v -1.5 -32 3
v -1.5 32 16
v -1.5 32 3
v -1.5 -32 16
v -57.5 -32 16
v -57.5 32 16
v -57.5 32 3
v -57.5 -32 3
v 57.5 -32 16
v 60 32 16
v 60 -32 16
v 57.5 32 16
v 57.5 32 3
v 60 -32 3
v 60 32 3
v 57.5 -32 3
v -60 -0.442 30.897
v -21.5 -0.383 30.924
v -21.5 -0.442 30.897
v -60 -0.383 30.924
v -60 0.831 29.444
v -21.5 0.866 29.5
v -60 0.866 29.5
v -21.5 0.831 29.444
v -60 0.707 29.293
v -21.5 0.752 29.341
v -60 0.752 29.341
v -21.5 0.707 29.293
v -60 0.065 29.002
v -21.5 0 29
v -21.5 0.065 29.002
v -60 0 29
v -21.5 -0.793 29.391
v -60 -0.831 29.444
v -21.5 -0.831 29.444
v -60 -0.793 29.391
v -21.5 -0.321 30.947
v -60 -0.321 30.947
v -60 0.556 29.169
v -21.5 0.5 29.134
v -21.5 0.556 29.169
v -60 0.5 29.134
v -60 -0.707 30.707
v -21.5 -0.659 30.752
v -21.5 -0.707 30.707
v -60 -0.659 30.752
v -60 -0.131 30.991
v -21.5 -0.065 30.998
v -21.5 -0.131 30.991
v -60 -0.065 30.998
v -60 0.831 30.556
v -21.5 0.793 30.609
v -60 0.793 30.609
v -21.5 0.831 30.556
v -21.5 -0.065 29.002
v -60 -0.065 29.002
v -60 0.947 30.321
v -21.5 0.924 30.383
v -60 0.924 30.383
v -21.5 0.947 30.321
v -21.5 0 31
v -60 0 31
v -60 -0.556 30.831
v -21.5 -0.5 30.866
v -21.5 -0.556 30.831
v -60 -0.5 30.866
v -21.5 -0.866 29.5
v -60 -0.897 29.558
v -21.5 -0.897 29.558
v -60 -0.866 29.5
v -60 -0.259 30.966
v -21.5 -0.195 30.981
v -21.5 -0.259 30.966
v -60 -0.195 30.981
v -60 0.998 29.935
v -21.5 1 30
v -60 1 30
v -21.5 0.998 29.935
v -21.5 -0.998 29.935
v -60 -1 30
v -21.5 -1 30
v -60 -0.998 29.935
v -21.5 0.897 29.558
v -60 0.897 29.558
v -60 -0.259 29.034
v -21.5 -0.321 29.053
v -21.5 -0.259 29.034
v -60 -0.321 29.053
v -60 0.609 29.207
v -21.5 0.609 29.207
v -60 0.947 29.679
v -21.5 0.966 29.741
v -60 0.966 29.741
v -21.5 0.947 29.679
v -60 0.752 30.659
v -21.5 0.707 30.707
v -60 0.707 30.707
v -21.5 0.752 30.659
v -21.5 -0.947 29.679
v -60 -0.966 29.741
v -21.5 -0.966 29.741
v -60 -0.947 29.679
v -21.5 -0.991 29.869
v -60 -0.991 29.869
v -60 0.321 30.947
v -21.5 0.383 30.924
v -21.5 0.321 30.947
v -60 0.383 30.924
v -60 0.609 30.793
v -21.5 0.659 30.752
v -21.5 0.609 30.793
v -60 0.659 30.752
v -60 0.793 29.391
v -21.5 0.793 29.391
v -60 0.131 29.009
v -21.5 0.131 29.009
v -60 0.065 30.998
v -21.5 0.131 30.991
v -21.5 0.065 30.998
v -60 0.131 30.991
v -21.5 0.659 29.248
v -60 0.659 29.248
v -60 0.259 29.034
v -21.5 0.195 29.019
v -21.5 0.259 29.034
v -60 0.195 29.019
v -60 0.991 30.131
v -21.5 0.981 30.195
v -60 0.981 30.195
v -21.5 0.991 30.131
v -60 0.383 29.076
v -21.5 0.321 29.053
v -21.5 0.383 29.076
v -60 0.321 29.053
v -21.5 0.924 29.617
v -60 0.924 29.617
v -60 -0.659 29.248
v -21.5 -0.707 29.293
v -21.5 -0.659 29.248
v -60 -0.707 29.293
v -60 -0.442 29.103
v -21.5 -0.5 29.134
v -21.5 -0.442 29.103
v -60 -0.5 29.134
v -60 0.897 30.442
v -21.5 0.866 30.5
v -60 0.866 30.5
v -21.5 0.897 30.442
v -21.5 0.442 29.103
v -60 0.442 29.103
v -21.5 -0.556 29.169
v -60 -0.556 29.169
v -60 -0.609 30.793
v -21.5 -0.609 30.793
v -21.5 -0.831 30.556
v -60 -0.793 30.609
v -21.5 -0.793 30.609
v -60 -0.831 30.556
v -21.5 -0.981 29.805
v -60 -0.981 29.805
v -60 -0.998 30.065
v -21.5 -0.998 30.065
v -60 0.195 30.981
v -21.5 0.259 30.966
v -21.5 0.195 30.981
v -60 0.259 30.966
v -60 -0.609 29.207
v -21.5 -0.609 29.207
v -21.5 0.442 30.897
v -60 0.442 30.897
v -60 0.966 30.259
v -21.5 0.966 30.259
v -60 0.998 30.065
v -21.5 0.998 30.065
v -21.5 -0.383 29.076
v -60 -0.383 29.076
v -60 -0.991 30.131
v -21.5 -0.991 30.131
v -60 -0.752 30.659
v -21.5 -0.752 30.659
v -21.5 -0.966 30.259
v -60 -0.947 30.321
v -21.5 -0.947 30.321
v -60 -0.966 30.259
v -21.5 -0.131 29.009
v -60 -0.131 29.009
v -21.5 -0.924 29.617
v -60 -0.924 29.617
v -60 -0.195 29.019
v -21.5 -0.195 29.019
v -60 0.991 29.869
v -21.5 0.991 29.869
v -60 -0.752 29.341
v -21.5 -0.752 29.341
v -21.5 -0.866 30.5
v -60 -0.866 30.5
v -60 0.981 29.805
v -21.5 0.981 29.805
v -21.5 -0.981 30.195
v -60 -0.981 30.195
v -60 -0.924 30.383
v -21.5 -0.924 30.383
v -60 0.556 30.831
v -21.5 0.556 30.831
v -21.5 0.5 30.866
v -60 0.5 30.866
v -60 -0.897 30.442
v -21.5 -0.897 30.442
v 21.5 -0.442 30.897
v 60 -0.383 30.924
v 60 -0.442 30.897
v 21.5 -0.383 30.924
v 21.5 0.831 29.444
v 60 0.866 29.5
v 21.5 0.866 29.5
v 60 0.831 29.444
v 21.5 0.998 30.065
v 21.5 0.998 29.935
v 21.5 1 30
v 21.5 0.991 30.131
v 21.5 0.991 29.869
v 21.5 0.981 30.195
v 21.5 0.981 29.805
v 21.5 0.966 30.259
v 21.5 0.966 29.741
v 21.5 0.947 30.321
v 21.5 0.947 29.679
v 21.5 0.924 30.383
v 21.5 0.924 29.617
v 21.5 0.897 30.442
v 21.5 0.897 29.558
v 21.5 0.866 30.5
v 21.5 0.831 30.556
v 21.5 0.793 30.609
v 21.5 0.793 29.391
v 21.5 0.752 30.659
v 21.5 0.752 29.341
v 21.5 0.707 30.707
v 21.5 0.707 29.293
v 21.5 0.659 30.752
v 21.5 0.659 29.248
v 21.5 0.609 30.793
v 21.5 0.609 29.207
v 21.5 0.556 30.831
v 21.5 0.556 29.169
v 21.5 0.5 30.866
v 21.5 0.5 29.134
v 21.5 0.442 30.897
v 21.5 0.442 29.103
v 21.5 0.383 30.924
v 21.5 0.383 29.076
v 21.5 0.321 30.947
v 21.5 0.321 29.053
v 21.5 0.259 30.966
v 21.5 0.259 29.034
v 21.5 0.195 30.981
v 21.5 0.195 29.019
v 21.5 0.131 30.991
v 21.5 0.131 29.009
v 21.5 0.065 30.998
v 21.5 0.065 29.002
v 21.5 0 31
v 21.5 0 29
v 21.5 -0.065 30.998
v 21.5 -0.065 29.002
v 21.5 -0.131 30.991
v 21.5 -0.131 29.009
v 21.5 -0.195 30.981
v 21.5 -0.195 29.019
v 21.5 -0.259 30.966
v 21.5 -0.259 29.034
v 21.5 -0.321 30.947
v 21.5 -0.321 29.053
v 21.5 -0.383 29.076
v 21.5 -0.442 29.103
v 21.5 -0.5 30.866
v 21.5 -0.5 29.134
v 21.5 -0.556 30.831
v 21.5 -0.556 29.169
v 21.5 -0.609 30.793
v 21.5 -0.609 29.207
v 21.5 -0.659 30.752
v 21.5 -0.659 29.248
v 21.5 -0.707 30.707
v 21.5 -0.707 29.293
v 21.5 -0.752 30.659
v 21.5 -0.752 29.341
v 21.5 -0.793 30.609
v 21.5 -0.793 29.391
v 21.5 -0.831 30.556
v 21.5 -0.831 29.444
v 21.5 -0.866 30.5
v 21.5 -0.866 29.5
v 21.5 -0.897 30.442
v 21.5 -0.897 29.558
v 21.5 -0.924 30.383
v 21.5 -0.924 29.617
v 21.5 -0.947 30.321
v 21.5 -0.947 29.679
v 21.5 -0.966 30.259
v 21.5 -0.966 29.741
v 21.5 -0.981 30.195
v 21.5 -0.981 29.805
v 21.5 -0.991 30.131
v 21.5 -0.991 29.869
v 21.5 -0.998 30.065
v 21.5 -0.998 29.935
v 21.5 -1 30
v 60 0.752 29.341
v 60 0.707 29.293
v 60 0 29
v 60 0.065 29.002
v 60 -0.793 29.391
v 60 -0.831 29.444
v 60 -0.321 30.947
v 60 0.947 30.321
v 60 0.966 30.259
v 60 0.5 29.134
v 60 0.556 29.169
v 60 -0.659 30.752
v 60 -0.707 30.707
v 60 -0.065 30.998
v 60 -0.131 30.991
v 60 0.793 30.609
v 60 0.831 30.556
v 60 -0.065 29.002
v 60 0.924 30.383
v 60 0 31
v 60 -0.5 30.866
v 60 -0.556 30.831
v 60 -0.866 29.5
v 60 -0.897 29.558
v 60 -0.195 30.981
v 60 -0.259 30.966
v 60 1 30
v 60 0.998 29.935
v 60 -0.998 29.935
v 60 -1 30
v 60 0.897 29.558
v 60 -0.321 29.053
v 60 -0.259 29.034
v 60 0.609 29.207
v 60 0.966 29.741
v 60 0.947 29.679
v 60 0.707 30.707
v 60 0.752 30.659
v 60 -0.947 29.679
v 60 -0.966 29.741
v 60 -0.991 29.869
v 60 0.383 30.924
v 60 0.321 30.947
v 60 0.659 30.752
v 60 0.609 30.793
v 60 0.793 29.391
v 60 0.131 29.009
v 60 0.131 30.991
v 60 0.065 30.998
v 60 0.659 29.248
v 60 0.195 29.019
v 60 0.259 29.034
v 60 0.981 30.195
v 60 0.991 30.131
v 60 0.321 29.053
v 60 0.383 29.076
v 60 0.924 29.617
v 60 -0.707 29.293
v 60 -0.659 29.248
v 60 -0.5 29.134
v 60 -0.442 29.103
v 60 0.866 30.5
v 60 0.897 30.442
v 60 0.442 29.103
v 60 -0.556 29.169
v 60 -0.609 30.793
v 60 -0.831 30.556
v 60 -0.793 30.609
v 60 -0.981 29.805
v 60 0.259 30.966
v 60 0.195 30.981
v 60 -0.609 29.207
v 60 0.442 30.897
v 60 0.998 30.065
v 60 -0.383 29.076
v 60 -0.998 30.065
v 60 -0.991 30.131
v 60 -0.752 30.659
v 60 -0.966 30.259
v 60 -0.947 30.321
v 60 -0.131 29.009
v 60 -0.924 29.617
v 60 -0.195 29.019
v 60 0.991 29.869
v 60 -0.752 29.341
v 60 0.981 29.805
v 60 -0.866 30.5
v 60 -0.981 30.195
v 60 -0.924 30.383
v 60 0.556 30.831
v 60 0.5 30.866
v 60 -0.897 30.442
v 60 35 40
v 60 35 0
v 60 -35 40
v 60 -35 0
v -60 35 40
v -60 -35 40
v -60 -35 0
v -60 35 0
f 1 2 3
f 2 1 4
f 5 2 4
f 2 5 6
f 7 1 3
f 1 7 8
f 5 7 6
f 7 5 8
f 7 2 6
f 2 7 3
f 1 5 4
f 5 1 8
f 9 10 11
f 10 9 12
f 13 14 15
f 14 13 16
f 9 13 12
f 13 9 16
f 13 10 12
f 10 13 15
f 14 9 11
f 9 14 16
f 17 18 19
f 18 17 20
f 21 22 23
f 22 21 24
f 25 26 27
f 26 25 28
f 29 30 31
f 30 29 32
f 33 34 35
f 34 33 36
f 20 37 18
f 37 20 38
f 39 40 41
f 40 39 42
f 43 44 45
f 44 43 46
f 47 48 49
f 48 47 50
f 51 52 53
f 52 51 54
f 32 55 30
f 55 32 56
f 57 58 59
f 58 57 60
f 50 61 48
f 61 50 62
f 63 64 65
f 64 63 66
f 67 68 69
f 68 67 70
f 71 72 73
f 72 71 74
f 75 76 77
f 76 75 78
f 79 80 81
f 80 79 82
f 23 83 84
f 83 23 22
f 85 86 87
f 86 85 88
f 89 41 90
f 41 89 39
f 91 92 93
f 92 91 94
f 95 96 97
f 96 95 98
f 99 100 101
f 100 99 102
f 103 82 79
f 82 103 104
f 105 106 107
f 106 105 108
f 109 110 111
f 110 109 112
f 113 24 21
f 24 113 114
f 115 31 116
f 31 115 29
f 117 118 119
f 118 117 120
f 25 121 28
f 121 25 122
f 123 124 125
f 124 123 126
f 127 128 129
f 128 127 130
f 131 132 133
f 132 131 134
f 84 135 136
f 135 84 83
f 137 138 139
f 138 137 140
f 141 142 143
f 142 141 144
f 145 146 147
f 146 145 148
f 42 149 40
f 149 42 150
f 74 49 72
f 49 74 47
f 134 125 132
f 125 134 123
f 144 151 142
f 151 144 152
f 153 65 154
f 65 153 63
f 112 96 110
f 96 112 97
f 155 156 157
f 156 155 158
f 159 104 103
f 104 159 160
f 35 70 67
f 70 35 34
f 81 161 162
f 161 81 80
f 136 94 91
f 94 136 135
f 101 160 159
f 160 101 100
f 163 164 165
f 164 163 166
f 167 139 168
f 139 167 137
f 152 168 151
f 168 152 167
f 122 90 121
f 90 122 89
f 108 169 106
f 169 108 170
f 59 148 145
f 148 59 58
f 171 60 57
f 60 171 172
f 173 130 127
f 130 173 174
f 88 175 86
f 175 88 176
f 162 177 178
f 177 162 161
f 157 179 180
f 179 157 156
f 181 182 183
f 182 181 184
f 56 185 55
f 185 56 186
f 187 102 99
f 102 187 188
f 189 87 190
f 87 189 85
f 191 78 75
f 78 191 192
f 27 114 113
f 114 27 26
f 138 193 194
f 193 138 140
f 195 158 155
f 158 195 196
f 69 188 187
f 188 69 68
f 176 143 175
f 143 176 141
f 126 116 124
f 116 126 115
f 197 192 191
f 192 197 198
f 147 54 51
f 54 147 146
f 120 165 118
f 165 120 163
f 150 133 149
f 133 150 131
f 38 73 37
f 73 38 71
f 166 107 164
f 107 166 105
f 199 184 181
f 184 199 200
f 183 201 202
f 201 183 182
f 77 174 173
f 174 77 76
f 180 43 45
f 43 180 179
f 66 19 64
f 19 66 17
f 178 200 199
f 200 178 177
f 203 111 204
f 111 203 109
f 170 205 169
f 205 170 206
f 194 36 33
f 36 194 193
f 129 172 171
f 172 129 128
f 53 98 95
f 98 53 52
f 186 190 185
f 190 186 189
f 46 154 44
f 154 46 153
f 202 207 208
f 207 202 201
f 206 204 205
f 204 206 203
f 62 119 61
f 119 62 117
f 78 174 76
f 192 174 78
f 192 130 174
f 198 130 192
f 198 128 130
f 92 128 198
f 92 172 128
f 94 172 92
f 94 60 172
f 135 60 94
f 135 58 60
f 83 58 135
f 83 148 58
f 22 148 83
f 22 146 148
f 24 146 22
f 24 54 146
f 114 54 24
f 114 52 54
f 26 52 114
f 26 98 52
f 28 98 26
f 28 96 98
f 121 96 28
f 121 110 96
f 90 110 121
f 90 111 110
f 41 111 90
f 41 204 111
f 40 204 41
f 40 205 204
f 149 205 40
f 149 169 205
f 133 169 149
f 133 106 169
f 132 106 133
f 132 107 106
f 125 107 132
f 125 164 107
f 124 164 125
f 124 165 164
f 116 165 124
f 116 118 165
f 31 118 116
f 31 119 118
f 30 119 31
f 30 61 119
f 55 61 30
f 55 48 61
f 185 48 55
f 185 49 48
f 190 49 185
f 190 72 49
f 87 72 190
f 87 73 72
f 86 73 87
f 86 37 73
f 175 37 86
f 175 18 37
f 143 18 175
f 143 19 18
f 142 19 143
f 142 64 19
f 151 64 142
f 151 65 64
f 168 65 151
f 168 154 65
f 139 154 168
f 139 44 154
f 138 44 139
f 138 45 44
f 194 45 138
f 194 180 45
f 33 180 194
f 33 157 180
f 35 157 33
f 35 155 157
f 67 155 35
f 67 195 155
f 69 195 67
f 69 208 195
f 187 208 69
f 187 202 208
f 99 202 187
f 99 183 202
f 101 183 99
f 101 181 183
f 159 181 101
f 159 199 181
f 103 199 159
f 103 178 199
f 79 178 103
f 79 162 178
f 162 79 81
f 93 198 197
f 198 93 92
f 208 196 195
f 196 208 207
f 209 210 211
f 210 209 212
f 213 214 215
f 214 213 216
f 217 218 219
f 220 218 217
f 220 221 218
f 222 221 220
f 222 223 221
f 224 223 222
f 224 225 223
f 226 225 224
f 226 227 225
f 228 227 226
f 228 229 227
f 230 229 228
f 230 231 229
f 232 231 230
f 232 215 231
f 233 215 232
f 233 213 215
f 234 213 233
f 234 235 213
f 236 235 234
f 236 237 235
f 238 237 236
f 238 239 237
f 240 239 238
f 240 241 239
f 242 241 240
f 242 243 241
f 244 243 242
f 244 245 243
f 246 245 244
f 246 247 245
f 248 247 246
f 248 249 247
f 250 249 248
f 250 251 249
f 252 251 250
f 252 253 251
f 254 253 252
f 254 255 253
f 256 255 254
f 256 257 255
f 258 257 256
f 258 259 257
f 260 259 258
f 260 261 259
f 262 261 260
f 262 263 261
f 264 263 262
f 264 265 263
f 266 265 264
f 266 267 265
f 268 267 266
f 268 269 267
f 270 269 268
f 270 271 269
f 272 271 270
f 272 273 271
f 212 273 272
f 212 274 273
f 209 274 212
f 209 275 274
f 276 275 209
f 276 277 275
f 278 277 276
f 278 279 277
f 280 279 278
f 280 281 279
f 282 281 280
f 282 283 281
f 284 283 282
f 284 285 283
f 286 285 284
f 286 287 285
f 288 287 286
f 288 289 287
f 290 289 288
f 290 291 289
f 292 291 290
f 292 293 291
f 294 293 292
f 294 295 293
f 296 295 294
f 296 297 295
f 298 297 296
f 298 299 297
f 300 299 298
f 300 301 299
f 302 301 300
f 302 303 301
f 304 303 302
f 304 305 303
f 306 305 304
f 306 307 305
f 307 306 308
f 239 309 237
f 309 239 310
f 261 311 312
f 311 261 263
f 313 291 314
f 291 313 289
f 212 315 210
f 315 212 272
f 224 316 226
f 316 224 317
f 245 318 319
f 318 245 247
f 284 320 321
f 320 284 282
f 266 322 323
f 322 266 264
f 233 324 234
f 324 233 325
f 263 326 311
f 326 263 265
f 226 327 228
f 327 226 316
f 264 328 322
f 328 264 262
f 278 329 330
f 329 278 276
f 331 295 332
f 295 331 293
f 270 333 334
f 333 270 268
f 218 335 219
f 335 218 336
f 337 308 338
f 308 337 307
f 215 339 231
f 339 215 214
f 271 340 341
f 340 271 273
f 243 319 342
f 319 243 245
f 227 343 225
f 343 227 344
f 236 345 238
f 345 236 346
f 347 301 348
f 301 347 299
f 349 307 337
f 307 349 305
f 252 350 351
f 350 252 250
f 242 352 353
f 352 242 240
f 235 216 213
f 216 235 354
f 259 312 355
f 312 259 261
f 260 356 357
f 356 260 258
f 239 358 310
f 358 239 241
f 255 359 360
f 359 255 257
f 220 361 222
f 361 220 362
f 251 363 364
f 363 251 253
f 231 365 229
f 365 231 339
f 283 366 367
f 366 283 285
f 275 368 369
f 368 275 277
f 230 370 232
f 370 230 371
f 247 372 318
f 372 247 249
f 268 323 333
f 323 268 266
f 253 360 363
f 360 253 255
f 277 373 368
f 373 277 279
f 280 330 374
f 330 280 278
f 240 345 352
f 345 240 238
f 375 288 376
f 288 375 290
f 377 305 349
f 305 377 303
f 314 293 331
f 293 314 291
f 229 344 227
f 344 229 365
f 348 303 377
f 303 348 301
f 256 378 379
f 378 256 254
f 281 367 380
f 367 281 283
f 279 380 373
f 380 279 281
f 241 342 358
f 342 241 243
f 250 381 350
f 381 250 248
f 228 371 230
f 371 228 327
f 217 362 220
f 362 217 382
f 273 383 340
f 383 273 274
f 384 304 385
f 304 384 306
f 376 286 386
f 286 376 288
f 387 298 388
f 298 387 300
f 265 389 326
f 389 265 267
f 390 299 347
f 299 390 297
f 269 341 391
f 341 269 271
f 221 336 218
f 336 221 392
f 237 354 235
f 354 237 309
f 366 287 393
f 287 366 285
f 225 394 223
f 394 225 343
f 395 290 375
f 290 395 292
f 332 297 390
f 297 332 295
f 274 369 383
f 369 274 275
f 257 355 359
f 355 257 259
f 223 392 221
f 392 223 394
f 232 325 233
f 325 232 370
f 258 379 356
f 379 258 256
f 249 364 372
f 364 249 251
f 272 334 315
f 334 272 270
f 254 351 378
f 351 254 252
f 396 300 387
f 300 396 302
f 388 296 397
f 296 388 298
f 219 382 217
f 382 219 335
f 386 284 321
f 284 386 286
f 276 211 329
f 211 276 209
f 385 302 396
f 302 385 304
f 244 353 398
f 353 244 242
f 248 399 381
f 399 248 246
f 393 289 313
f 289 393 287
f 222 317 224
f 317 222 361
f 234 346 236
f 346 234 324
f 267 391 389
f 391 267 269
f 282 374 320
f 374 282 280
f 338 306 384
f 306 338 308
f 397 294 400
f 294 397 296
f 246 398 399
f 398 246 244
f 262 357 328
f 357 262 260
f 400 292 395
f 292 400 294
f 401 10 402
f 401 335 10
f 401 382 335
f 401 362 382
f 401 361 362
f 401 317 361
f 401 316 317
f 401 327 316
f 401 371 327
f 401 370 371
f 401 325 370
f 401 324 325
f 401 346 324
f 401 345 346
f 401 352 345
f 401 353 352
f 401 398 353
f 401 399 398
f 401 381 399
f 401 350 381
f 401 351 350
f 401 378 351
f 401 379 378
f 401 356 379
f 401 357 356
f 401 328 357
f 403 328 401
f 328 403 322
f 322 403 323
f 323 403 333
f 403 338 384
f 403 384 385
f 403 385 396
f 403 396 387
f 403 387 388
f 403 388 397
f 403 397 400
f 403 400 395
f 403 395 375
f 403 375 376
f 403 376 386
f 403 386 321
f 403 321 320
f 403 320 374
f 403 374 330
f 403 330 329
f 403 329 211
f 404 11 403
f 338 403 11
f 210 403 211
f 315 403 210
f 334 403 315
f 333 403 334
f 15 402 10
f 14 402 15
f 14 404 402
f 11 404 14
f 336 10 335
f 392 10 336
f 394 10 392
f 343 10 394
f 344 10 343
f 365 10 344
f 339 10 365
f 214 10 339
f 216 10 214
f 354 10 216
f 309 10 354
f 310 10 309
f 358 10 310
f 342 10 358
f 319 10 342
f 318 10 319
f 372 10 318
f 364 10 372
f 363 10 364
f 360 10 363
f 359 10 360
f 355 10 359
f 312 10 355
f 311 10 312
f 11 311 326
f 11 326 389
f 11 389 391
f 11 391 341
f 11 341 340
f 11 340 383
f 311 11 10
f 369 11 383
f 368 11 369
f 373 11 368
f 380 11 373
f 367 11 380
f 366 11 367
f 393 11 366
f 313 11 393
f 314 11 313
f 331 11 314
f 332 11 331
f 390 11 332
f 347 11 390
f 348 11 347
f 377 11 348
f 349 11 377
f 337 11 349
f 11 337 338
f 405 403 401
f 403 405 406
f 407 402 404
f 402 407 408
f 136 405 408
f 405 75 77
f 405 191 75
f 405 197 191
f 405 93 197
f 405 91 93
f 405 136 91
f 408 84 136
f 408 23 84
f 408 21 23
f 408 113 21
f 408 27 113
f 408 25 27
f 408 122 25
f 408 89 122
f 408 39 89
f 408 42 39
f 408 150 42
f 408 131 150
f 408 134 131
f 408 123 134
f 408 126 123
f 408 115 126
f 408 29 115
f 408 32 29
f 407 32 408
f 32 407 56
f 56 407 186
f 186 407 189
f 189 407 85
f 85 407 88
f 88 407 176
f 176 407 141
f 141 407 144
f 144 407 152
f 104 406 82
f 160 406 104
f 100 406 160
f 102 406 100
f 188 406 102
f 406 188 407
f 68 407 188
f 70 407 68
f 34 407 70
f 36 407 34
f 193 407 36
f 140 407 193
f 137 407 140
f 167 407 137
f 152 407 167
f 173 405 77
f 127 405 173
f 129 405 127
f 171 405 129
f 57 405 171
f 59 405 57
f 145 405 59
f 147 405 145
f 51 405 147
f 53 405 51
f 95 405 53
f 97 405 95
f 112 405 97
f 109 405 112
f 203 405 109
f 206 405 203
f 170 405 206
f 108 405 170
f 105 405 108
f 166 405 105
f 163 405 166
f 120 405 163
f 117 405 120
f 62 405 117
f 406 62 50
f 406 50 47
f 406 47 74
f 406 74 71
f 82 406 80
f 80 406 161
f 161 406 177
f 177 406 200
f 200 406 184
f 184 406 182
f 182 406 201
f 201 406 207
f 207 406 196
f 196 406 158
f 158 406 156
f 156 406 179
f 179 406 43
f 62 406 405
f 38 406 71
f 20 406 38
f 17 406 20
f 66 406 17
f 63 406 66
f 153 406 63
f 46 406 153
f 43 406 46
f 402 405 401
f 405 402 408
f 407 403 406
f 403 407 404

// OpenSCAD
// Mini horizontal gel-electrophoresis box - buffer tank
// Print orientation: tank rests on XY plane at z = 0, builds upward (+Z)

// ---------------- Parameters ----------------
tank_x      = 120;   // outer length in X (mm)
tank_y      = 70;    // outer width in Y (mm)
tank_h      = 40;    // outer height in Z (mm)
wall        = 3;     // wall thickness (mm)
floor       = 3;     // floor thickness (mm)

platform_x  = 60;    // platform length in X (mm), centred
platform_z  = 10;    // platform height above inner floor (mm) -> z = floor + platform_z = 13

hole_d      = 2;     // electrode hole diameter (mm)
hole_y      = 0;     // electrode hole Y position (mm)
hole_z      = 30;    // electrode hole Z position (mm)

eps         = 0.5;   // cutter overshoot past faces (mm)
$fn         = 96;    // curve resolution

// ---------------- Derived ----------------
inner_f = tank_x - 2*wall;   // inner floor length in X
inner_w = tank_y - 2*wall;   // inner width in Y
inner_h = tank_h - floor;    // inner height (floor to top)

// ---------------- Model ----------------
difference() {
    // Tank body: open top, solid floor
    translate([-tank_x/2, -tank_y/2, 0])
        cube([tank_x, tank_y, tank_h]);

    // Cut out the two buffer chambers above the central platform
    // (each chamber is floor + platform_z tall, open above)
    for (sx = [-1, 1])
        translate([sx < 0 ? -inner_f/2 - eps : inner_f/2 + eps,
                   -inner_w/2,
                   floor])
            cube([inner_f/2 - 1, inner_w, floor + platform_z]);

    // Horizontal electrode holes through each end wall, along X
    for (x0 = [-tank_x/2 + wall, tank_x/2 - wall])
        translate([x0, hole_y, hole_z])
            rotate([0, 90, 0])
                cylinder(d = hole_d, h = tank_y + 2*eps, center = true);
}
